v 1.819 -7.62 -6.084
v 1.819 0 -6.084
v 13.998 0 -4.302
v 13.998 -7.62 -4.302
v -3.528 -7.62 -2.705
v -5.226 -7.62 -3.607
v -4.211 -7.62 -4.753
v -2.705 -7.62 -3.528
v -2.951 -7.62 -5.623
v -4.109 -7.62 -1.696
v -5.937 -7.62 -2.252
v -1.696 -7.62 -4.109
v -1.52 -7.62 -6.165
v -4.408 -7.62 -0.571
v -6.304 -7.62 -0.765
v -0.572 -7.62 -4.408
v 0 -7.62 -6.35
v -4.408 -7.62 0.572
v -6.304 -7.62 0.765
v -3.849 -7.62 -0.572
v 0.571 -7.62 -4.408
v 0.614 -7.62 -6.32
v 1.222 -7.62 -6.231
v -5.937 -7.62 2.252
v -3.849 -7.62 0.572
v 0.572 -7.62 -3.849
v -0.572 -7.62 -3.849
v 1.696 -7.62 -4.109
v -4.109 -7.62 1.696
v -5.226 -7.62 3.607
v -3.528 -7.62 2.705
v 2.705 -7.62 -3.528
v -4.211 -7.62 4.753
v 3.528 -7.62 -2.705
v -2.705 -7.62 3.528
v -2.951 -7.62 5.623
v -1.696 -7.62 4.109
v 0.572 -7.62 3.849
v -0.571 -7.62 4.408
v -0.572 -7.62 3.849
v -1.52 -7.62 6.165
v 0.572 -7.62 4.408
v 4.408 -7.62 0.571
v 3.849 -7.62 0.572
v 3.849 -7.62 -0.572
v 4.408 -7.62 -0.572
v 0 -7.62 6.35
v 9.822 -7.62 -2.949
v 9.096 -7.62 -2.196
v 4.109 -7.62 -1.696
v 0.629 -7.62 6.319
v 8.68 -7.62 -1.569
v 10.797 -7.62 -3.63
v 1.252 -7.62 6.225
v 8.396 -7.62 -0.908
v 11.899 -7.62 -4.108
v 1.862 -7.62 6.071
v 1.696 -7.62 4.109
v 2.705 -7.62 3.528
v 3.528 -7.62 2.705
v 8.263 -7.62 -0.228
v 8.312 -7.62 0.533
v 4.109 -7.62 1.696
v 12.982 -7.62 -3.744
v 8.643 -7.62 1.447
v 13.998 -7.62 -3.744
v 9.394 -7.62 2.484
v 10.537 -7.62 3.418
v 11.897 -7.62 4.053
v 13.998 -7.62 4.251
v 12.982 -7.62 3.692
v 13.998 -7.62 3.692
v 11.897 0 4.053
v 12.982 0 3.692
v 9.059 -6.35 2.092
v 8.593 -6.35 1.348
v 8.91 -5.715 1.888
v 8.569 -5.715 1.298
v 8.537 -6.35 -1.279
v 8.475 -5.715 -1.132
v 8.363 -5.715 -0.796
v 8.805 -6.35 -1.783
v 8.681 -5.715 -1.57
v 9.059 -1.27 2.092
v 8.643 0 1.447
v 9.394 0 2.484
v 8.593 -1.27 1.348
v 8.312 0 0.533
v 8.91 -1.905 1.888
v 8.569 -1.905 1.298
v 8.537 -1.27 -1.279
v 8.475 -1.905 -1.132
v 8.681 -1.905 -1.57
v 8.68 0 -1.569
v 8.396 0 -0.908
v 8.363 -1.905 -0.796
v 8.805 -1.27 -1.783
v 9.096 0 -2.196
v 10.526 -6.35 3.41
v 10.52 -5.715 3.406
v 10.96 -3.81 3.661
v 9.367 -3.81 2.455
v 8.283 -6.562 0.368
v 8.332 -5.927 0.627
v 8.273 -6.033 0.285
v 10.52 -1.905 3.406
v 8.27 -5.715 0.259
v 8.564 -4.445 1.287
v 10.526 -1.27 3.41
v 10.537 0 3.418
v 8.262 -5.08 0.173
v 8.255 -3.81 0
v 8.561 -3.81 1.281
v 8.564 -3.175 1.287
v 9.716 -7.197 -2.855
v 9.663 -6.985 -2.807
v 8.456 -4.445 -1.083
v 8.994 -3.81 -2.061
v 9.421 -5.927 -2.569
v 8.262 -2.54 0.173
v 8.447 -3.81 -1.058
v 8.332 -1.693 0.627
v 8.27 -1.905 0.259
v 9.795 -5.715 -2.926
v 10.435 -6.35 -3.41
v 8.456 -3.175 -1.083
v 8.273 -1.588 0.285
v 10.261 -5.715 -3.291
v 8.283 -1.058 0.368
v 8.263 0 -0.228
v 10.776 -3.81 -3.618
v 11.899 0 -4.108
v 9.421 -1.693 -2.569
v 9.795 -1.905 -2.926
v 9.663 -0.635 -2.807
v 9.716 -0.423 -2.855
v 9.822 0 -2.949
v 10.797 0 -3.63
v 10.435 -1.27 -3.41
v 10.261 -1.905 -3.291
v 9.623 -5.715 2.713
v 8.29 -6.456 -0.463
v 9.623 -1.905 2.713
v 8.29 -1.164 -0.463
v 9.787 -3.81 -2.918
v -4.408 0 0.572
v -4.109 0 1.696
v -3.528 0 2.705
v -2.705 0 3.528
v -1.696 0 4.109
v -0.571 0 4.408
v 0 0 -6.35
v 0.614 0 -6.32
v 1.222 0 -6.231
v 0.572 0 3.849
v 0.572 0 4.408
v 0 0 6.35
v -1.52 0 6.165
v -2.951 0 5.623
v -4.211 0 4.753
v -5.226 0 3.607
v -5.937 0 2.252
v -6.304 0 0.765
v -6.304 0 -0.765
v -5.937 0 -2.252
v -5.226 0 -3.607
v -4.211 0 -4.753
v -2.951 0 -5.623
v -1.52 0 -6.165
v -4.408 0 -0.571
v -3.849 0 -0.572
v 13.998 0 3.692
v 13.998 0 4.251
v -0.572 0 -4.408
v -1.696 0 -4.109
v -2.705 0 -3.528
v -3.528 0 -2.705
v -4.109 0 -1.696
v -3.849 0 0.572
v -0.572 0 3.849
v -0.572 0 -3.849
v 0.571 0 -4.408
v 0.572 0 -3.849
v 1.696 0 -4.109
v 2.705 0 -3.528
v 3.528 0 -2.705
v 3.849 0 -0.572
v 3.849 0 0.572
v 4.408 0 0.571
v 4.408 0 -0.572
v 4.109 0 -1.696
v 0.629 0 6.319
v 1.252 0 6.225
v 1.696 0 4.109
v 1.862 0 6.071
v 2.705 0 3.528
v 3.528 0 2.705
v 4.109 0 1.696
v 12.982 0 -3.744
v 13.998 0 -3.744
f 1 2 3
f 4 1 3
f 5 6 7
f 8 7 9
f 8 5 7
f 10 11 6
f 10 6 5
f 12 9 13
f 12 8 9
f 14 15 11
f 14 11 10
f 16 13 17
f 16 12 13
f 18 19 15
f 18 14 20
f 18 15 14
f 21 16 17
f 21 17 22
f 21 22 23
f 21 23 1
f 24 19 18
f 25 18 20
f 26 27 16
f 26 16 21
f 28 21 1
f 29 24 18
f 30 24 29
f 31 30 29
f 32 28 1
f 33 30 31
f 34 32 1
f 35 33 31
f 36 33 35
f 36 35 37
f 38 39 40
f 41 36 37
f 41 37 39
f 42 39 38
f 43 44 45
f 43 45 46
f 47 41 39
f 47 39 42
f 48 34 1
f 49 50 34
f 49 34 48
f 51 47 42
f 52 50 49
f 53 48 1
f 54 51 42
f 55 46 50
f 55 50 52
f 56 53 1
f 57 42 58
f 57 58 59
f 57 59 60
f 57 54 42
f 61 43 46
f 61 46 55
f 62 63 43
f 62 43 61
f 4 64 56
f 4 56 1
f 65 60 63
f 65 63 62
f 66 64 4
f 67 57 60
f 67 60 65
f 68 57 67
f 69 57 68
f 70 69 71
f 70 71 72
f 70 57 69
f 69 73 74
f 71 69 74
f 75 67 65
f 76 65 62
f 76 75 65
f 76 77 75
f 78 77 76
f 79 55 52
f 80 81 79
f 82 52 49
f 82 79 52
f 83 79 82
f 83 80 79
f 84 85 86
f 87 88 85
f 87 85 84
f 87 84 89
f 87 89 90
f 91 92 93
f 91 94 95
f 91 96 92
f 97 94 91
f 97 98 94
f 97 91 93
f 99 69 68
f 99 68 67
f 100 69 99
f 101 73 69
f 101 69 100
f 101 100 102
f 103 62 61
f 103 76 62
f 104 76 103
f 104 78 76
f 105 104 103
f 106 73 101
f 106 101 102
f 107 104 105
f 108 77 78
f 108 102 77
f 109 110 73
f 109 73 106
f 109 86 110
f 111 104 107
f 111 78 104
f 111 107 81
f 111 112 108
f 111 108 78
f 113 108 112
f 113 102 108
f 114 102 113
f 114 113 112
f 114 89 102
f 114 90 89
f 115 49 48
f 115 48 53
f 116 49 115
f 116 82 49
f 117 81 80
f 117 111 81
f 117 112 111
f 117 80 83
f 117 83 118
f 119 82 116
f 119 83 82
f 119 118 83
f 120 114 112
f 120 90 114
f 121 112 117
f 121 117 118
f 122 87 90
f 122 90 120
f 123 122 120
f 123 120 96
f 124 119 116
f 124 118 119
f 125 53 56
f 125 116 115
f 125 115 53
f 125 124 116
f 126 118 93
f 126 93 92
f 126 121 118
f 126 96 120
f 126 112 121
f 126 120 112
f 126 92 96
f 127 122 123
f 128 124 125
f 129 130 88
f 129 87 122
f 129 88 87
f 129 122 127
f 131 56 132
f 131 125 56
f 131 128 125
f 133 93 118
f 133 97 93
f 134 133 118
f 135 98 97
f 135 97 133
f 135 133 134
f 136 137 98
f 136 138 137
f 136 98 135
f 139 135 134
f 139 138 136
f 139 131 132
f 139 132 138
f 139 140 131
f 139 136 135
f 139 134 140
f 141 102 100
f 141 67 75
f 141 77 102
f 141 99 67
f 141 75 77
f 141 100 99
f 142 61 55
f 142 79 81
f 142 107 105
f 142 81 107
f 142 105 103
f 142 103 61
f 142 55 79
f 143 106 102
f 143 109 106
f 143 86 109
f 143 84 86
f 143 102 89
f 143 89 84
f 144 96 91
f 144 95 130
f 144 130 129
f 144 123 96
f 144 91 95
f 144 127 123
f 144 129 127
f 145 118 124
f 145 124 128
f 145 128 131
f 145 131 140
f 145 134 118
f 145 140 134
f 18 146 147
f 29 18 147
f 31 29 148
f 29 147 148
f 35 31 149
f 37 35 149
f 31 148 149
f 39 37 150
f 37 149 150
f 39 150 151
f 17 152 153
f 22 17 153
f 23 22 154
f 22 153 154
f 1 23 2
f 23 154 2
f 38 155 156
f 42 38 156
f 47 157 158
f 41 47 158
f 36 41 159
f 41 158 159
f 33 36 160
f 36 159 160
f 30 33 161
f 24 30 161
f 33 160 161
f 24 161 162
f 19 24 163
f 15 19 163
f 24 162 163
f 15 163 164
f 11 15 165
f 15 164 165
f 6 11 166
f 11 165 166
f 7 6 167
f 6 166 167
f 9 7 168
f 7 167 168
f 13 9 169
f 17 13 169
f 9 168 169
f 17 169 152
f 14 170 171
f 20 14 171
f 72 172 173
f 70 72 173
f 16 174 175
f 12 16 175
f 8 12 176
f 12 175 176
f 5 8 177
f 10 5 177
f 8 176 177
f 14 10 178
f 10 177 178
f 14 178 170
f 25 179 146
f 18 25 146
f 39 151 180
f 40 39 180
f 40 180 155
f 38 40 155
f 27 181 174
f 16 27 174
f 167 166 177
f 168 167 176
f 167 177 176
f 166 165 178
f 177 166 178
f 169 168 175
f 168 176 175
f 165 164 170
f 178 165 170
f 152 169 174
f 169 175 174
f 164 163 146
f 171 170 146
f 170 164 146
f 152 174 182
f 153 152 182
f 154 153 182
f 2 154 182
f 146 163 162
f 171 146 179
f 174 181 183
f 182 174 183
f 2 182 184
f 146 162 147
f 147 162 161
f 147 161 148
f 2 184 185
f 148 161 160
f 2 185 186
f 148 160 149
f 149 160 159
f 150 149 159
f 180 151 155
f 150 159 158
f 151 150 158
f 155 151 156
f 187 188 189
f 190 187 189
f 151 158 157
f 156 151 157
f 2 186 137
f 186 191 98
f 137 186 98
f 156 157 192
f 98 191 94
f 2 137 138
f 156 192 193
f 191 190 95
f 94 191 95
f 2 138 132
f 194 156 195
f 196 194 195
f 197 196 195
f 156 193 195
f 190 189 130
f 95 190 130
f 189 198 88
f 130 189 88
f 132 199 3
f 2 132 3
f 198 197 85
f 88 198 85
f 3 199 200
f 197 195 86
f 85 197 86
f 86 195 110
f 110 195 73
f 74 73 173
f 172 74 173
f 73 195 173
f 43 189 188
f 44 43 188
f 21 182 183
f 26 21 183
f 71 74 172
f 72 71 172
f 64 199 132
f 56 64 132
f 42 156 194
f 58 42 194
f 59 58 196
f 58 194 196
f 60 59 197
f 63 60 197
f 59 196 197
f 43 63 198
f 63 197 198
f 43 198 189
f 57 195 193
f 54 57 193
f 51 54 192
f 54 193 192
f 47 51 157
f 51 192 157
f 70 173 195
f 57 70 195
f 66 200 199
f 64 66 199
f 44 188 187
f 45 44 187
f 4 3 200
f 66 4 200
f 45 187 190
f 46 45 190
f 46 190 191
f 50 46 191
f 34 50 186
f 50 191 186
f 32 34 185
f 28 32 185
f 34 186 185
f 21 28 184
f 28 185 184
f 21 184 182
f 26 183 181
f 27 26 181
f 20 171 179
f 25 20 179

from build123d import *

# Parameters (mm, degrees)
F1_DEPTH = 7.62


with BuildPart() as f1:
    # F0 (on Front) → F1 (new body)
    with BuildSketch(Plane.XZ):
        with BuildLine():
            Line((1.8622589664, 6.0707900262), (0, 6.35))
            ThreePointArc((0, 6.35), (-6.35, 0), (0, -6.35))
            Line((0, -6.35), (1.8187823812, -6.0839568251))
            ThreePointArc((1.8187823812, -6.0839568251), (5.0927285477, -3.7929692775), (6.35, 0))
            ThreePointArc((6.35, 0), (5.1062630385, 3.7747288355), (1.8622589664, 6.0707900262))
        make_face()
        with BuildLine():
            ThreePointArc((4.4081076155, 0.5715), (4.4357673153, 0.2863447651), (4.445, 0))
            ThreePointArc((4.445, 0), (4.4357673153, -0.2863447651), (4.4081076155, -0.5715))
            ThreePointArc((4.4081076155, -0.5715), (3.1430896424, -3.1430896424), (0.5715, -4.4081076155))
            ThreePointArc((0.5715, -4.4081076155), (0, -4.445), (-0.5715, -4.4081076155))
            ThreePointArc((-0.5715, -4.4081076155), (-3.1430896424, -3.1430896424), (-4.4081076155, -0.5715))
            ThreePointArc((-4.4081076155, -0.5715), (-4.445, 0), (-4.4081076155, 0.5715))
            ThreePointArc((-4.4081076155, 0.5715), (-3.1430896424, 3.1430896424), (-0.5715, 4.4081076155))
            ThreePointArc((-0.5715, 4.4081076155), (0, 4.445), (0.5715, 4.4081076155))
            ThreePointArc((0.5715, 4.4081076155), (3.1430896424, 3.1430896424), (4.4081076155, 0.5715))
        make_face(mode=Mode.SUBTRACT)
        with BuildLine():
            ThreePointArc((1.8622589664, 6.0707900262), (0.9415368643, 6.2798095778), (0, 6.35))
            Line((0, 6.35), (1.8622589664, 6.0707900262))
        make_face()
        with BuildLine():
            Line((1.8187823812, -6.0839568251), (0, -6.35))
            ThreePointArc((0, -6.35), (0.9190685939, -6.2831371877), (1.8187823812, -6.0839568251))
        make_face()
        with BuildLine():
            Line((13.9979512441, 4.2512759929), (1.8622589664, 6.0707900262))
            ThreePointArc((1.8622589664, 6.0707900262), (5.1062630385, 3.7747288355), (6.35, 0))
            ThreePointArc((6.35, 0), (5.0927285477, -3.7929692775), (1.8187823812, -6.0839568251))
            Line((1.8187823812, -6.0839568251), (13.9979512441, -4.3024436627))
            add(Edge.make_bspline(
                [(12.9819512441, -4.3278436627), (13.3216856344, -4.3582096926), (13.6625330249, -4.3515071069), (13.9979512441, -4.3024436627)],
                knots=[0.9379354435, 0.9379354435, 0.9379354435, 0.9379354435, 1, 1, 1, 1], degree=3))
            add(Edge.make_bspline(
                [(11.8986046127, -4.1080734588), (12.2530212332, -4.2197633946), (12.616843509, -4.2952097206), (12.9819512441, -4.3278436627)],
                knots=[0.8712355441, 0.8712355441, 0.8712355441, 0.8712355441, 0.9379354435, 0.9379354435, 0.9379354435, 0.9379354435], degree=3))
            add(Edge.make_bspline(
                [(11.8973232208, 4.0530741781), (9.9551383056, 3.4340248692), (6.5706535126, -0.0030113398), (9.9231723965, -3.4855408669), (11.8986046127, -4.1080734588)],
                knots=[0.1307760808, 0.1307760808, 0.1307760808, 0.1307760808, 0.4994664947, 0.8712355441, 0.8712355441, 0.8712355441, 0.8712355441], degree=3))
            add(Edge.make_bspline(
                [(13.9979512441, 4.2512759929), (13.30745774, 4.3548022353), (12.5862245912, 4.2726536393), (11.8973232208, 4.0530741781)],
                knots=[0, 0, 0, 0, 0.1307760808, 0.1307760808, 0.1307760808, 0.1307760808], degree=3))
        make_face()
        with BuildLine():
            Line((13.9979512441, 3.6924759929), (13.9979512441, 4.2512759929))
            add(Edge.make_bspline(
                [(13.9979512441, 4.2512759929), (13.30745774, 4.3548022353), (12.5862245912, 4.2726536393), (11.8973232208, 4.0530741781)],
                knots=[0, 0, 0, 0, 0.1307760808, 0.1307760808, 0.1307760808, 0.1307760808], degree=3))
            Line((11.8973232208, 4.0530741781), (12.9819512441, 3.6924759929))
            Line((12.9819512441, 3.6924759929), (13.9979512441, 3.6924759929))
        make_face()
        with BuildLine():
            add(Edge.make_bspline(
                [(12.9819512441, -4.3278436627), (13.3216856344, -4.3582096926), (13.6625330249, -4.3515071069), (13.9979512441, -4.3024436627)],
                knots=[0.9379354435, 0.9379354435, 0.9379354435, 0.9379354435, 1, 1, 1, 1], degree=3))
            Line((13.9979512441, -4.3024436627), (13.9979512441, -3.7436436627))
            Line((13.9979512441, -3.7436436627), (12.9819512441, -3.7436436627))
            Line((12.9819512441, -3.7436436627), (11.8986046127, -4.1080734588))
            add(Edge.make_bspline(
                [(11.8986046127, -4.1080734588), (12.2530212332, -4.2197633946), (12.616843509, -4.2952097206), (12.9819512441, -4.3278436627)],
                knots=[0.8712355441, 0.8712355441, 0.8712355441, 0.8712355441, 0.9379354435, 0.9379354435, 0.9379354435, 0.9379354435], degree=3))
        make_face()
        with BuildLine():
            ThreePointArc((4.4081076155, -0.5715), (4.4357673153, -0.2863447651), (4.445, 0))
            ThreePointArc((4.445, 0), (4.4357673153, 0.2863447651), (4.4081076155, 0.5715))
            Line((4.4081076155, 0.5715), (3.8493076155, 0.5715))
            Line((3.8493076155, 0.5715), (3.8493076155, -0.5715))
            Line((3.8493076155, -0.5715), (4.4081076155, -0.5715))
        make_face()
        with BuildLine():
            ThreePointArc((-0.5715, -4.4081076155), (0, -4.445), (0.5715, -4.4081076155))
            Line((0.5715, -4.4081076155), (0.5715, -3.8493076155))
            Line((0.5715, -3.8493076155), (-0.5715, -3.8493076155))
            Line((-0.5715, -3.8493076155), (-0.5715, -4.4081076155))
        make_face()
        with BuildLine():
            Line((-3.8493076155, 0.5715), (-4.4081076155, 0.5715))
            ThreePointArc((-4.4081076155, 0.5715), (-4.445, 0), (-4.4081076155, -0.5715))
            Line((-4.4081076155, -0.5715), (-3.8493076155, -0.5715))
            Line((-3.8493076155, -0.5715), (-3.8493076155, 0.5715))
        make_face()
        with BuildLine():
            Line((0.5715, 3.8493076155), (0.5715, 4.4081076155))
            ThreePointArc((0.5715, 4.4081076155), (0, 4.445), (-0.5715, 4.4081076155))
            Line((-0.5715, 4.4081076155), (-0.5715, 3.8493076155))
            Line((-0.5715, 3.8493076155), (0.5715, 3.8493076155))
        make_face()
    extrude(amount=F1_DEPTH)


solid = f1.part
